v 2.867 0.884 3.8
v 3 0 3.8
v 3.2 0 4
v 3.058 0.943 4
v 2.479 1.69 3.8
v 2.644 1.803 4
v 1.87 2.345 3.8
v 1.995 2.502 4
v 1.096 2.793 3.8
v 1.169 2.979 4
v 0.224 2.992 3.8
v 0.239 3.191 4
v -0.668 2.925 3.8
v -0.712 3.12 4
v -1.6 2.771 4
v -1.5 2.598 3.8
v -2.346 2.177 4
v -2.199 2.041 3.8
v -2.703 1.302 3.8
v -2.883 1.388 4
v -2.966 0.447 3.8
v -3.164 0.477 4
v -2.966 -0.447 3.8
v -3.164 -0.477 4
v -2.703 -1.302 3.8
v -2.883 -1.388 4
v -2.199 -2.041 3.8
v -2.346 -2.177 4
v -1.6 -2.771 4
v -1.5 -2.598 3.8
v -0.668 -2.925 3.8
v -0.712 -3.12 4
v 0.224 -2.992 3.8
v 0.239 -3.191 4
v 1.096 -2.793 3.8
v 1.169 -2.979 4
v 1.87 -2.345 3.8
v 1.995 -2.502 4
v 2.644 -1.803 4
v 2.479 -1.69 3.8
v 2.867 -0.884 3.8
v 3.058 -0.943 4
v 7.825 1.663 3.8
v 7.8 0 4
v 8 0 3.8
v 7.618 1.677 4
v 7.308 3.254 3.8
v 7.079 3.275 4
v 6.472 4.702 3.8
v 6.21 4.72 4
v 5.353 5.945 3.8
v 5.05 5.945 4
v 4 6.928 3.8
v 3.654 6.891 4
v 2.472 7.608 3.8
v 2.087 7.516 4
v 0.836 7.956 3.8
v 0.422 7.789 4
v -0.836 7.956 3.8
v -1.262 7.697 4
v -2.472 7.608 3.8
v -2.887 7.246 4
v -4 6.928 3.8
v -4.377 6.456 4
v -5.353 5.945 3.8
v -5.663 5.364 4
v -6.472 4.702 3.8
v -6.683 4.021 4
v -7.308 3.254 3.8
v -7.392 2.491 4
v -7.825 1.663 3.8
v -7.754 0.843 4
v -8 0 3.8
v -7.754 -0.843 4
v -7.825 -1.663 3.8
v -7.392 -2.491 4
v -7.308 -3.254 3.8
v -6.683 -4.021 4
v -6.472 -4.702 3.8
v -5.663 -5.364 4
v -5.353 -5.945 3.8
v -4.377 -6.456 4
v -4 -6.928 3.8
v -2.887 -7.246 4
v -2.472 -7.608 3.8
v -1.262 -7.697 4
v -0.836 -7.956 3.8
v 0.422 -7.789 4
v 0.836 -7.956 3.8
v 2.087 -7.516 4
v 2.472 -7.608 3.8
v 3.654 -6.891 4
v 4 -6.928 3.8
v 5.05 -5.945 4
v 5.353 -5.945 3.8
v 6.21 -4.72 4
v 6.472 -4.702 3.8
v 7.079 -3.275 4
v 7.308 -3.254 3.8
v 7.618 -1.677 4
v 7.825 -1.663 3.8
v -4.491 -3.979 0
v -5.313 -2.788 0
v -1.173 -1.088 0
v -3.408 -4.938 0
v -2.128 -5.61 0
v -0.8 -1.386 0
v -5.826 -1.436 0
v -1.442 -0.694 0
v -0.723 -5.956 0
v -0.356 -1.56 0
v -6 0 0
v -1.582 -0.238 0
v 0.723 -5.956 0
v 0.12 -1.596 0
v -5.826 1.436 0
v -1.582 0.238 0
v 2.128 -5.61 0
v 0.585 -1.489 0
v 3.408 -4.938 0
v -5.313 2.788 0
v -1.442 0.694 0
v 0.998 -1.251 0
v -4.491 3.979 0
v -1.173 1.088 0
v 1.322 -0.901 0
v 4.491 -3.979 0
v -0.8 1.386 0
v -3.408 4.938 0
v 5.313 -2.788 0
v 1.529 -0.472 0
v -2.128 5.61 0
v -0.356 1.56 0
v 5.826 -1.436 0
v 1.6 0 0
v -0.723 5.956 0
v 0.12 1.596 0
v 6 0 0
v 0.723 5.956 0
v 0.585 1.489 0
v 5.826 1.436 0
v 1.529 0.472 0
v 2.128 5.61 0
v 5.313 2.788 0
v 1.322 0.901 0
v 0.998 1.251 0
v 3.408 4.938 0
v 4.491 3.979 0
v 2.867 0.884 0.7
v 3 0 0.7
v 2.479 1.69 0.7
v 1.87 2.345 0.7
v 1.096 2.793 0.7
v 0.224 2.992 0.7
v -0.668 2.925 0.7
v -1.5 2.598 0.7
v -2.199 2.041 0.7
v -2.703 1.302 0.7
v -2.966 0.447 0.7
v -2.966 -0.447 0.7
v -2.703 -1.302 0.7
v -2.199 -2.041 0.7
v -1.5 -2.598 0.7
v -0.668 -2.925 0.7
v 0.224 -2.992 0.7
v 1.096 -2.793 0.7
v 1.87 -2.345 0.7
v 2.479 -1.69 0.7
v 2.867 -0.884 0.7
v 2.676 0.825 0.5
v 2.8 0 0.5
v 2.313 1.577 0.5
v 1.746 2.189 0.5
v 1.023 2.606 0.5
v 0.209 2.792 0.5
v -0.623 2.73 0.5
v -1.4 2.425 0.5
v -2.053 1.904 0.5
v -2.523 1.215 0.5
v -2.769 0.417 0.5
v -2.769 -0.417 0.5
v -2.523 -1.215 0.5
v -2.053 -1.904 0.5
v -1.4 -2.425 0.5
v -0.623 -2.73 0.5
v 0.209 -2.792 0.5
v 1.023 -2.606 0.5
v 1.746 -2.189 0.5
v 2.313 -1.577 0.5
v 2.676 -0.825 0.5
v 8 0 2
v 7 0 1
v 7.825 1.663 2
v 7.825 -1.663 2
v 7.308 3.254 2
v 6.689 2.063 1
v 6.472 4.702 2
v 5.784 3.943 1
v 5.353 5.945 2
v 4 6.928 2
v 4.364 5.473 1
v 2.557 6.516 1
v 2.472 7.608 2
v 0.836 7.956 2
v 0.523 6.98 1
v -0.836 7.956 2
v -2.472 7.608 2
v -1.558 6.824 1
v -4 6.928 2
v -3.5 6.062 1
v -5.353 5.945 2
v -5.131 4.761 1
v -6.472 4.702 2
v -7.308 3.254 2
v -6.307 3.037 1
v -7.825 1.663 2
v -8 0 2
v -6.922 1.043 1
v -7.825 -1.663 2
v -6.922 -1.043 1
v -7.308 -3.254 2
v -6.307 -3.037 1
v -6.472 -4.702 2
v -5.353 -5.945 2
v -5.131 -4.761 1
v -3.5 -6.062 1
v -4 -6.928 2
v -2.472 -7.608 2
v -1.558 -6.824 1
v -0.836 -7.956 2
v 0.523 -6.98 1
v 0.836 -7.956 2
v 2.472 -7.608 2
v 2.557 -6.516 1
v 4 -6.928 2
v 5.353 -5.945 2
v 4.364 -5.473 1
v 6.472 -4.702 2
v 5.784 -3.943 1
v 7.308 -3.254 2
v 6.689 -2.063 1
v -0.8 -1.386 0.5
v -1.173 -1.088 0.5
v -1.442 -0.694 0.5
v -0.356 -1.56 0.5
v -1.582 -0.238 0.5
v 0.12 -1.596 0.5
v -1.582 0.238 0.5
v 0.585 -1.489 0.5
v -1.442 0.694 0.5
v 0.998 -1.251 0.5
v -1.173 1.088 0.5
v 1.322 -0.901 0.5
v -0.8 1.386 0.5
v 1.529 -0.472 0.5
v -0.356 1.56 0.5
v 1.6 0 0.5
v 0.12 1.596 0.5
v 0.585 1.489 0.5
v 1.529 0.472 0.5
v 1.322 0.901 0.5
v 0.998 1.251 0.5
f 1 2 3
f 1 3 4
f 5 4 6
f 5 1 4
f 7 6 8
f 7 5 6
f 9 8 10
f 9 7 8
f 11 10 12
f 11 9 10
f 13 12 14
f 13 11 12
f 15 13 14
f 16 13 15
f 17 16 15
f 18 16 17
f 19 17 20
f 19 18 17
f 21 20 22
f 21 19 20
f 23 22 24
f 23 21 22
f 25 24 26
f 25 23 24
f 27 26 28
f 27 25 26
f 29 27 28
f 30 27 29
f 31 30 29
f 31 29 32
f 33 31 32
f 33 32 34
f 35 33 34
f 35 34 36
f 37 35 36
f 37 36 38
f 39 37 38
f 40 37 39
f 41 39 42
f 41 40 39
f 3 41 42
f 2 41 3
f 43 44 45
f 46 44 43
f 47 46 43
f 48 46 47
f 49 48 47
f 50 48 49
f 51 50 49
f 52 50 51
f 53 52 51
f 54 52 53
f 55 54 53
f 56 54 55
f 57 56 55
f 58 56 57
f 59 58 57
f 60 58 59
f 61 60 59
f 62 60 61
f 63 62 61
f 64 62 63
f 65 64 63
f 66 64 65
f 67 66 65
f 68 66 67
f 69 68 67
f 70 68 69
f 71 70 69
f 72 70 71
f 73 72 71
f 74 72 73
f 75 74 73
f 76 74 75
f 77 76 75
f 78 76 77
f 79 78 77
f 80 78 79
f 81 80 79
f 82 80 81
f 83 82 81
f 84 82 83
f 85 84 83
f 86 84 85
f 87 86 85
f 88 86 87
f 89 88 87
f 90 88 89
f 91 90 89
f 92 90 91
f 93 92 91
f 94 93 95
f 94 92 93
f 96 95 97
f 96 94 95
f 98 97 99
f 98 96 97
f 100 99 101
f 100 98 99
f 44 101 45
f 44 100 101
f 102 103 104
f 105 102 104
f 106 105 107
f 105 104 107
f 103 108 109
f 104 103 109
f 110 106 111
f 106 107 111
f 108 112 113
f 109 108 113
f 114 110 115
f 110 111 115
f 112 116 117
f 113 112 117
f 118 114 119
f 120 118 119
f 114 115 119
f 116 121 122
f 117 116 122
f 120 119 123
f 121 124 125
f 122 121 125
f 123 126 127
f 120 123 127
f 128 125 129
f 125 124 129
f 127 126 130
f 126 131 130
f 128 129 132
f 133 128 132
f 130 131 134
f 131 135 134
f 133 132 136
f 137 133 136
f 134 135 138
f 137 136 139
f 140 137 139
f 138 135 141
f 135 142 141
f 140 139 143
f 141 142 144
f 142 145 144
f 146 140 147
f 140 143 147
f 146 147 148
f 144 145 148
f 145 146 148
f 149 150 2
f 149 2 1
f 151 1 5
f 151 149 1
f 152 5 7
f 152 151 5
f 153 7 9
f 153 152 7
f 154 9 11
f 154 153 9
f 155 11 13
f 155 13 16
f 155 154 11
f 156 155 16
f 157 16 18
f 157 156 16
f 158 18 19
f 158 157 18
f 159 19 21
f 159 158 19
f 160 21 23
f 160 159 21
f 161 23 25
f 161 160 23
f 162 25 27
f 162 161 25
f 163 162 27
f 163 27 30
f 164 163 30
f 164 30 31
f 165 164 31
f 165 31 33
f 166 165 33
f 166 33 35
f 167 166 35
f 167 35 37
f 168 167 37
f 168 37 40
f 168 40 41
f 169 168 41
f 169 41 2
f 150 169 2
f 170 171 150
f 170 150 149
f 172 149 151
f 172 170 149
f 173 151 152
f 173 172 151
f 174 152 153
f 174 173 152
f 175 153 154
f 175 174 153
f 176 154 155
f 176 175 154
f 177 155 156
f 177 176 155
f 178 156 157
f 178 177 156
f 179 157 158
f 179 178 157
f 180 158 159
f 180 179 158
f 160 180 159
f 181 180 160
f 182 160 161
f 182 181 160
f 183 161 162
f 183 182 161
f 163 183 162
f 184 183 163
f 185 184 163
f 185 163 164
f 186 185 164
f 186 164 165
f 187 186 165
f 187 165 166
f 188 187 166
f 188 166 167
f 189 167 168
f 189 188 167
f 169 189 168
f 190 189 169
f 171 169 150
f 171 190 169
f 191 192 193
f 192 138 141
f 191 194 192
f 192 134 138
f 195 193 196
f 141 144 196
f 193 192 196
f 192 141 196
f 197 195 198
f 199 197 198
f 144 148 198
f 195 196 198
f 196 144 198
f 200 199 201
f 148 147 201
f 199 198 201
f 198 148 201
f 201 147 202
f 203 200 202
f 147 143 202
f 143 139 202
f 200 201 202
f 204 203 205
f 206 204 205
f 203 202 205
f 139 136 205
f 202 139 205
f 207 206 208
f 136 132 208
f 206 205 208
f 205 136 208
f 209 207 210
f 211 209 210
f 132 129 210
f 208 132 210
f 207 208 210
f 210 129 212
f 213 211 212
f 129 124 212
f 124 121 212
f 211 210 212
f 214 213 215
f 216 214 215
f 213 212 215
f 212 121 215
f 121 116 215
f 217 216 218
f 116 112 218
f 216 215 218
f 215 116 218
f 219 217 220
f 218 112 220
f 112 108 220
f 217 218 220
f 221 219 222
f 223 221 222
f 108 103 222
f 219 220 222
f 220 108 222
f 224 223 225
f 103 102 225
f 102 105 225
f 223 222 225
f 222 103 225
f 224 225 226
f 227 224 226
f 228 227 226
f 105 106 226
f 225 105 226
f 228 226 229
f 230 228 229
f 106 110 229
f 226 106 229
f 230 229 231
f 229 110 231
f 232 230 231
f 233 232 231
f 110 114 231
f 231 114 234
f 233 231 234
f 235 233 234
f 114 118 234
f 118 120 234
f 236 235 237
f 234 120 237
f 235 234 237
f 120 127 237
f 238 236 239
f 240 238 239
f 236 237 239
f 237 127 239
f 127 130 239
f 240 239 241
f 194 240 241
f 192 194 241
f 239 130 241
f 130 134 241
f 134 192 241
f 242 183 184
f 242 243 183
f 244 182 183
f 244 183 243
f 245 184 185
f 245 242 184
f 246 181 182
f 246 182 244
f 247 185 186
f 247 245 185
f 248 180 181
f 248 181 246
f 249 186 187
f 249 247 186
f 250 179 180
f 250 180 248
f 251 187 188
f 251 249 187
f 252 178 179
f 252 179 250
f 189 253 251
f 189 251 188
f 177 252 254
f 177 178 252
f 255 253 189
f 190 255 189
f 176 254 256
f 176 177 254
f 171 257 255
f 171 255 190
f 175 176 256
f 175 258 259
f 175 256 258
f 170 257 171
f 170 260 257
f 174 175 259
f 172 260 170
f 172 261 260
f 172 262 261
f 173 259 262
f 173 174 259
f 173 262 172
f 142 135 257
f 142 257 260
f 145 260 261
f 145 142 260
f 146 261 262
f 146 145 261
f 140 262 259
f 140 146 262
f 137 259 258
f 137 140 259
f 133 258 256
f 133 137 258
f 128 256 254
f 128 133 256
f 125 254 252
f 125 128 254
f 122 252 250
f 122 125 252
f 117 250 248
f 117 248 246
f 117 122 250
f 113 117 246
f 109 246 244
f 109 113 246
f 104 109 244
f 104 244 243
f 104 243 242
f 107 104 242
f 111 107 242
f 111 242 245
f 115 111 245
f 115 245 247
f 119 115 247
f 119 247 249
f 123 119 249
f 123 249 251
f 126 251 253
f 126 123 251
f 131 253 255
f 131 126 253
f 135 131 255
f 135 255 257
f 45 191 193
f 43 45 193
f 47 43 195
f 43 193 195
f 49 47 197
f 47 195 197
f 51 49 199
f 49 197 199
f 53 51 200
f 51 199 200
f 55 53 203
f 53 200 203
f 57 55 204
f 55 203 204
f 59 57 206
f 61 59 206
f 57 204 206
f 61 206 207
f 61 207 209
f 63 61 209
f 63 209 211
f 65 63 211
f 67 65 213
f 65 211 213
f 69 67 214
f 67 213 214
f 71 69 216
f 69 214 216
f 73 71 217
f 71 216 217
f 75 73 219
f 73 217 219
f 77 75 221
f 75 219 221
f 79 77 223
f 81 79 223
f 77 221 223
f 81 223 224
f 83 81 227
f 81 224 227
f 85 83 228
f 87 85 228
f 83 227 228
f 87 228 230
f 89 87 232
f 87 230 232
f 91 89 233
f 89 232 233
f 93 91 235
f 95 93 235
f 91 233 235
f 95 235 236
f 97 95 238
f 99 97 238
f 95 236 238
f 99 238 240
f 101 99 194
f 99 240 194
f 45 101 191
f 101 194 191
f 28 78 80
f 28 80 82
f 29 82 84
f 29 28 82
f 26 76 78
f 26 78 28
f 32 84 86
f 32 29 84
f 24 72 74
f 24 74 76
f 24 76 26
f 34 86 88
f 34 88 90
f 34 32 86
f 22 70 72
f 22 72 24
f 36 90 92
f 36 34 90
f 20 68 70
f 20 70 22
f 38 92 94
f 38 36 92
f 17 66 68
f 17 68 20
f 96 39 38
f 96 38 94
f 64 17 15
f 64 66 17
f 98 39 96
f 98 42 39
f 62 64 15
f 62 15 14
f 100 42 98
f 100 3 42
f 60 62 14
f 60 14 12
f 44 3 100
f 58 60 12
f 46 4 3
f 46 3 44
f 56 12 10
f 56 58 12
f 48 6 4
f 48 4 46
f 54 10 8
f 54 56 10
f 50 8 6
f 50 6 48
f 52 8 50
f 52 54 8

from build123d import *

# Parameters (mm, degrees)
F0_R     = 3
F0_R_2   = 1.6
F1_DEPTH = 0.5
F0_R_3   = 8
F2_DEPTH = 4
F3_SIZE  = 2
F4_SIZE  = 0.2


with BuildPart() as f1:
    # F0 (on Top) → F1 (new body)
    with BuildSketch(Plane.XY):
        Circle(F0_R)
        Circle(F0_R_2, mode=Mode.SUBTRACT)
    extrude(amount=F1_DEPTH)

    # F0 (on Top) → F2 (join)
    with BuildSketch(Plane.XY):
        Circle(F0_R_3)
        Circle(F0_R, mode=Mode.SUBTRACT)
    extrude(amount=F2_DEPTH)

    # F3
    f3_edges = [f1.edges().sort_by_distance(p)[0] for p in [
        (-8, 0, 0),
    ]]
    chamfer(f3_edges, length=F3_SIZE)

    # F4
    f4_edges = [f1.edges().sort_by_distance(p)[0] for p in [
        (-8, 0, 4),
        (-3, 0, 4),
        (-3, 0, 0.5),
    ]]
    chamfer(f4_edges, length=F4_SIZE)


solid = f1.part
